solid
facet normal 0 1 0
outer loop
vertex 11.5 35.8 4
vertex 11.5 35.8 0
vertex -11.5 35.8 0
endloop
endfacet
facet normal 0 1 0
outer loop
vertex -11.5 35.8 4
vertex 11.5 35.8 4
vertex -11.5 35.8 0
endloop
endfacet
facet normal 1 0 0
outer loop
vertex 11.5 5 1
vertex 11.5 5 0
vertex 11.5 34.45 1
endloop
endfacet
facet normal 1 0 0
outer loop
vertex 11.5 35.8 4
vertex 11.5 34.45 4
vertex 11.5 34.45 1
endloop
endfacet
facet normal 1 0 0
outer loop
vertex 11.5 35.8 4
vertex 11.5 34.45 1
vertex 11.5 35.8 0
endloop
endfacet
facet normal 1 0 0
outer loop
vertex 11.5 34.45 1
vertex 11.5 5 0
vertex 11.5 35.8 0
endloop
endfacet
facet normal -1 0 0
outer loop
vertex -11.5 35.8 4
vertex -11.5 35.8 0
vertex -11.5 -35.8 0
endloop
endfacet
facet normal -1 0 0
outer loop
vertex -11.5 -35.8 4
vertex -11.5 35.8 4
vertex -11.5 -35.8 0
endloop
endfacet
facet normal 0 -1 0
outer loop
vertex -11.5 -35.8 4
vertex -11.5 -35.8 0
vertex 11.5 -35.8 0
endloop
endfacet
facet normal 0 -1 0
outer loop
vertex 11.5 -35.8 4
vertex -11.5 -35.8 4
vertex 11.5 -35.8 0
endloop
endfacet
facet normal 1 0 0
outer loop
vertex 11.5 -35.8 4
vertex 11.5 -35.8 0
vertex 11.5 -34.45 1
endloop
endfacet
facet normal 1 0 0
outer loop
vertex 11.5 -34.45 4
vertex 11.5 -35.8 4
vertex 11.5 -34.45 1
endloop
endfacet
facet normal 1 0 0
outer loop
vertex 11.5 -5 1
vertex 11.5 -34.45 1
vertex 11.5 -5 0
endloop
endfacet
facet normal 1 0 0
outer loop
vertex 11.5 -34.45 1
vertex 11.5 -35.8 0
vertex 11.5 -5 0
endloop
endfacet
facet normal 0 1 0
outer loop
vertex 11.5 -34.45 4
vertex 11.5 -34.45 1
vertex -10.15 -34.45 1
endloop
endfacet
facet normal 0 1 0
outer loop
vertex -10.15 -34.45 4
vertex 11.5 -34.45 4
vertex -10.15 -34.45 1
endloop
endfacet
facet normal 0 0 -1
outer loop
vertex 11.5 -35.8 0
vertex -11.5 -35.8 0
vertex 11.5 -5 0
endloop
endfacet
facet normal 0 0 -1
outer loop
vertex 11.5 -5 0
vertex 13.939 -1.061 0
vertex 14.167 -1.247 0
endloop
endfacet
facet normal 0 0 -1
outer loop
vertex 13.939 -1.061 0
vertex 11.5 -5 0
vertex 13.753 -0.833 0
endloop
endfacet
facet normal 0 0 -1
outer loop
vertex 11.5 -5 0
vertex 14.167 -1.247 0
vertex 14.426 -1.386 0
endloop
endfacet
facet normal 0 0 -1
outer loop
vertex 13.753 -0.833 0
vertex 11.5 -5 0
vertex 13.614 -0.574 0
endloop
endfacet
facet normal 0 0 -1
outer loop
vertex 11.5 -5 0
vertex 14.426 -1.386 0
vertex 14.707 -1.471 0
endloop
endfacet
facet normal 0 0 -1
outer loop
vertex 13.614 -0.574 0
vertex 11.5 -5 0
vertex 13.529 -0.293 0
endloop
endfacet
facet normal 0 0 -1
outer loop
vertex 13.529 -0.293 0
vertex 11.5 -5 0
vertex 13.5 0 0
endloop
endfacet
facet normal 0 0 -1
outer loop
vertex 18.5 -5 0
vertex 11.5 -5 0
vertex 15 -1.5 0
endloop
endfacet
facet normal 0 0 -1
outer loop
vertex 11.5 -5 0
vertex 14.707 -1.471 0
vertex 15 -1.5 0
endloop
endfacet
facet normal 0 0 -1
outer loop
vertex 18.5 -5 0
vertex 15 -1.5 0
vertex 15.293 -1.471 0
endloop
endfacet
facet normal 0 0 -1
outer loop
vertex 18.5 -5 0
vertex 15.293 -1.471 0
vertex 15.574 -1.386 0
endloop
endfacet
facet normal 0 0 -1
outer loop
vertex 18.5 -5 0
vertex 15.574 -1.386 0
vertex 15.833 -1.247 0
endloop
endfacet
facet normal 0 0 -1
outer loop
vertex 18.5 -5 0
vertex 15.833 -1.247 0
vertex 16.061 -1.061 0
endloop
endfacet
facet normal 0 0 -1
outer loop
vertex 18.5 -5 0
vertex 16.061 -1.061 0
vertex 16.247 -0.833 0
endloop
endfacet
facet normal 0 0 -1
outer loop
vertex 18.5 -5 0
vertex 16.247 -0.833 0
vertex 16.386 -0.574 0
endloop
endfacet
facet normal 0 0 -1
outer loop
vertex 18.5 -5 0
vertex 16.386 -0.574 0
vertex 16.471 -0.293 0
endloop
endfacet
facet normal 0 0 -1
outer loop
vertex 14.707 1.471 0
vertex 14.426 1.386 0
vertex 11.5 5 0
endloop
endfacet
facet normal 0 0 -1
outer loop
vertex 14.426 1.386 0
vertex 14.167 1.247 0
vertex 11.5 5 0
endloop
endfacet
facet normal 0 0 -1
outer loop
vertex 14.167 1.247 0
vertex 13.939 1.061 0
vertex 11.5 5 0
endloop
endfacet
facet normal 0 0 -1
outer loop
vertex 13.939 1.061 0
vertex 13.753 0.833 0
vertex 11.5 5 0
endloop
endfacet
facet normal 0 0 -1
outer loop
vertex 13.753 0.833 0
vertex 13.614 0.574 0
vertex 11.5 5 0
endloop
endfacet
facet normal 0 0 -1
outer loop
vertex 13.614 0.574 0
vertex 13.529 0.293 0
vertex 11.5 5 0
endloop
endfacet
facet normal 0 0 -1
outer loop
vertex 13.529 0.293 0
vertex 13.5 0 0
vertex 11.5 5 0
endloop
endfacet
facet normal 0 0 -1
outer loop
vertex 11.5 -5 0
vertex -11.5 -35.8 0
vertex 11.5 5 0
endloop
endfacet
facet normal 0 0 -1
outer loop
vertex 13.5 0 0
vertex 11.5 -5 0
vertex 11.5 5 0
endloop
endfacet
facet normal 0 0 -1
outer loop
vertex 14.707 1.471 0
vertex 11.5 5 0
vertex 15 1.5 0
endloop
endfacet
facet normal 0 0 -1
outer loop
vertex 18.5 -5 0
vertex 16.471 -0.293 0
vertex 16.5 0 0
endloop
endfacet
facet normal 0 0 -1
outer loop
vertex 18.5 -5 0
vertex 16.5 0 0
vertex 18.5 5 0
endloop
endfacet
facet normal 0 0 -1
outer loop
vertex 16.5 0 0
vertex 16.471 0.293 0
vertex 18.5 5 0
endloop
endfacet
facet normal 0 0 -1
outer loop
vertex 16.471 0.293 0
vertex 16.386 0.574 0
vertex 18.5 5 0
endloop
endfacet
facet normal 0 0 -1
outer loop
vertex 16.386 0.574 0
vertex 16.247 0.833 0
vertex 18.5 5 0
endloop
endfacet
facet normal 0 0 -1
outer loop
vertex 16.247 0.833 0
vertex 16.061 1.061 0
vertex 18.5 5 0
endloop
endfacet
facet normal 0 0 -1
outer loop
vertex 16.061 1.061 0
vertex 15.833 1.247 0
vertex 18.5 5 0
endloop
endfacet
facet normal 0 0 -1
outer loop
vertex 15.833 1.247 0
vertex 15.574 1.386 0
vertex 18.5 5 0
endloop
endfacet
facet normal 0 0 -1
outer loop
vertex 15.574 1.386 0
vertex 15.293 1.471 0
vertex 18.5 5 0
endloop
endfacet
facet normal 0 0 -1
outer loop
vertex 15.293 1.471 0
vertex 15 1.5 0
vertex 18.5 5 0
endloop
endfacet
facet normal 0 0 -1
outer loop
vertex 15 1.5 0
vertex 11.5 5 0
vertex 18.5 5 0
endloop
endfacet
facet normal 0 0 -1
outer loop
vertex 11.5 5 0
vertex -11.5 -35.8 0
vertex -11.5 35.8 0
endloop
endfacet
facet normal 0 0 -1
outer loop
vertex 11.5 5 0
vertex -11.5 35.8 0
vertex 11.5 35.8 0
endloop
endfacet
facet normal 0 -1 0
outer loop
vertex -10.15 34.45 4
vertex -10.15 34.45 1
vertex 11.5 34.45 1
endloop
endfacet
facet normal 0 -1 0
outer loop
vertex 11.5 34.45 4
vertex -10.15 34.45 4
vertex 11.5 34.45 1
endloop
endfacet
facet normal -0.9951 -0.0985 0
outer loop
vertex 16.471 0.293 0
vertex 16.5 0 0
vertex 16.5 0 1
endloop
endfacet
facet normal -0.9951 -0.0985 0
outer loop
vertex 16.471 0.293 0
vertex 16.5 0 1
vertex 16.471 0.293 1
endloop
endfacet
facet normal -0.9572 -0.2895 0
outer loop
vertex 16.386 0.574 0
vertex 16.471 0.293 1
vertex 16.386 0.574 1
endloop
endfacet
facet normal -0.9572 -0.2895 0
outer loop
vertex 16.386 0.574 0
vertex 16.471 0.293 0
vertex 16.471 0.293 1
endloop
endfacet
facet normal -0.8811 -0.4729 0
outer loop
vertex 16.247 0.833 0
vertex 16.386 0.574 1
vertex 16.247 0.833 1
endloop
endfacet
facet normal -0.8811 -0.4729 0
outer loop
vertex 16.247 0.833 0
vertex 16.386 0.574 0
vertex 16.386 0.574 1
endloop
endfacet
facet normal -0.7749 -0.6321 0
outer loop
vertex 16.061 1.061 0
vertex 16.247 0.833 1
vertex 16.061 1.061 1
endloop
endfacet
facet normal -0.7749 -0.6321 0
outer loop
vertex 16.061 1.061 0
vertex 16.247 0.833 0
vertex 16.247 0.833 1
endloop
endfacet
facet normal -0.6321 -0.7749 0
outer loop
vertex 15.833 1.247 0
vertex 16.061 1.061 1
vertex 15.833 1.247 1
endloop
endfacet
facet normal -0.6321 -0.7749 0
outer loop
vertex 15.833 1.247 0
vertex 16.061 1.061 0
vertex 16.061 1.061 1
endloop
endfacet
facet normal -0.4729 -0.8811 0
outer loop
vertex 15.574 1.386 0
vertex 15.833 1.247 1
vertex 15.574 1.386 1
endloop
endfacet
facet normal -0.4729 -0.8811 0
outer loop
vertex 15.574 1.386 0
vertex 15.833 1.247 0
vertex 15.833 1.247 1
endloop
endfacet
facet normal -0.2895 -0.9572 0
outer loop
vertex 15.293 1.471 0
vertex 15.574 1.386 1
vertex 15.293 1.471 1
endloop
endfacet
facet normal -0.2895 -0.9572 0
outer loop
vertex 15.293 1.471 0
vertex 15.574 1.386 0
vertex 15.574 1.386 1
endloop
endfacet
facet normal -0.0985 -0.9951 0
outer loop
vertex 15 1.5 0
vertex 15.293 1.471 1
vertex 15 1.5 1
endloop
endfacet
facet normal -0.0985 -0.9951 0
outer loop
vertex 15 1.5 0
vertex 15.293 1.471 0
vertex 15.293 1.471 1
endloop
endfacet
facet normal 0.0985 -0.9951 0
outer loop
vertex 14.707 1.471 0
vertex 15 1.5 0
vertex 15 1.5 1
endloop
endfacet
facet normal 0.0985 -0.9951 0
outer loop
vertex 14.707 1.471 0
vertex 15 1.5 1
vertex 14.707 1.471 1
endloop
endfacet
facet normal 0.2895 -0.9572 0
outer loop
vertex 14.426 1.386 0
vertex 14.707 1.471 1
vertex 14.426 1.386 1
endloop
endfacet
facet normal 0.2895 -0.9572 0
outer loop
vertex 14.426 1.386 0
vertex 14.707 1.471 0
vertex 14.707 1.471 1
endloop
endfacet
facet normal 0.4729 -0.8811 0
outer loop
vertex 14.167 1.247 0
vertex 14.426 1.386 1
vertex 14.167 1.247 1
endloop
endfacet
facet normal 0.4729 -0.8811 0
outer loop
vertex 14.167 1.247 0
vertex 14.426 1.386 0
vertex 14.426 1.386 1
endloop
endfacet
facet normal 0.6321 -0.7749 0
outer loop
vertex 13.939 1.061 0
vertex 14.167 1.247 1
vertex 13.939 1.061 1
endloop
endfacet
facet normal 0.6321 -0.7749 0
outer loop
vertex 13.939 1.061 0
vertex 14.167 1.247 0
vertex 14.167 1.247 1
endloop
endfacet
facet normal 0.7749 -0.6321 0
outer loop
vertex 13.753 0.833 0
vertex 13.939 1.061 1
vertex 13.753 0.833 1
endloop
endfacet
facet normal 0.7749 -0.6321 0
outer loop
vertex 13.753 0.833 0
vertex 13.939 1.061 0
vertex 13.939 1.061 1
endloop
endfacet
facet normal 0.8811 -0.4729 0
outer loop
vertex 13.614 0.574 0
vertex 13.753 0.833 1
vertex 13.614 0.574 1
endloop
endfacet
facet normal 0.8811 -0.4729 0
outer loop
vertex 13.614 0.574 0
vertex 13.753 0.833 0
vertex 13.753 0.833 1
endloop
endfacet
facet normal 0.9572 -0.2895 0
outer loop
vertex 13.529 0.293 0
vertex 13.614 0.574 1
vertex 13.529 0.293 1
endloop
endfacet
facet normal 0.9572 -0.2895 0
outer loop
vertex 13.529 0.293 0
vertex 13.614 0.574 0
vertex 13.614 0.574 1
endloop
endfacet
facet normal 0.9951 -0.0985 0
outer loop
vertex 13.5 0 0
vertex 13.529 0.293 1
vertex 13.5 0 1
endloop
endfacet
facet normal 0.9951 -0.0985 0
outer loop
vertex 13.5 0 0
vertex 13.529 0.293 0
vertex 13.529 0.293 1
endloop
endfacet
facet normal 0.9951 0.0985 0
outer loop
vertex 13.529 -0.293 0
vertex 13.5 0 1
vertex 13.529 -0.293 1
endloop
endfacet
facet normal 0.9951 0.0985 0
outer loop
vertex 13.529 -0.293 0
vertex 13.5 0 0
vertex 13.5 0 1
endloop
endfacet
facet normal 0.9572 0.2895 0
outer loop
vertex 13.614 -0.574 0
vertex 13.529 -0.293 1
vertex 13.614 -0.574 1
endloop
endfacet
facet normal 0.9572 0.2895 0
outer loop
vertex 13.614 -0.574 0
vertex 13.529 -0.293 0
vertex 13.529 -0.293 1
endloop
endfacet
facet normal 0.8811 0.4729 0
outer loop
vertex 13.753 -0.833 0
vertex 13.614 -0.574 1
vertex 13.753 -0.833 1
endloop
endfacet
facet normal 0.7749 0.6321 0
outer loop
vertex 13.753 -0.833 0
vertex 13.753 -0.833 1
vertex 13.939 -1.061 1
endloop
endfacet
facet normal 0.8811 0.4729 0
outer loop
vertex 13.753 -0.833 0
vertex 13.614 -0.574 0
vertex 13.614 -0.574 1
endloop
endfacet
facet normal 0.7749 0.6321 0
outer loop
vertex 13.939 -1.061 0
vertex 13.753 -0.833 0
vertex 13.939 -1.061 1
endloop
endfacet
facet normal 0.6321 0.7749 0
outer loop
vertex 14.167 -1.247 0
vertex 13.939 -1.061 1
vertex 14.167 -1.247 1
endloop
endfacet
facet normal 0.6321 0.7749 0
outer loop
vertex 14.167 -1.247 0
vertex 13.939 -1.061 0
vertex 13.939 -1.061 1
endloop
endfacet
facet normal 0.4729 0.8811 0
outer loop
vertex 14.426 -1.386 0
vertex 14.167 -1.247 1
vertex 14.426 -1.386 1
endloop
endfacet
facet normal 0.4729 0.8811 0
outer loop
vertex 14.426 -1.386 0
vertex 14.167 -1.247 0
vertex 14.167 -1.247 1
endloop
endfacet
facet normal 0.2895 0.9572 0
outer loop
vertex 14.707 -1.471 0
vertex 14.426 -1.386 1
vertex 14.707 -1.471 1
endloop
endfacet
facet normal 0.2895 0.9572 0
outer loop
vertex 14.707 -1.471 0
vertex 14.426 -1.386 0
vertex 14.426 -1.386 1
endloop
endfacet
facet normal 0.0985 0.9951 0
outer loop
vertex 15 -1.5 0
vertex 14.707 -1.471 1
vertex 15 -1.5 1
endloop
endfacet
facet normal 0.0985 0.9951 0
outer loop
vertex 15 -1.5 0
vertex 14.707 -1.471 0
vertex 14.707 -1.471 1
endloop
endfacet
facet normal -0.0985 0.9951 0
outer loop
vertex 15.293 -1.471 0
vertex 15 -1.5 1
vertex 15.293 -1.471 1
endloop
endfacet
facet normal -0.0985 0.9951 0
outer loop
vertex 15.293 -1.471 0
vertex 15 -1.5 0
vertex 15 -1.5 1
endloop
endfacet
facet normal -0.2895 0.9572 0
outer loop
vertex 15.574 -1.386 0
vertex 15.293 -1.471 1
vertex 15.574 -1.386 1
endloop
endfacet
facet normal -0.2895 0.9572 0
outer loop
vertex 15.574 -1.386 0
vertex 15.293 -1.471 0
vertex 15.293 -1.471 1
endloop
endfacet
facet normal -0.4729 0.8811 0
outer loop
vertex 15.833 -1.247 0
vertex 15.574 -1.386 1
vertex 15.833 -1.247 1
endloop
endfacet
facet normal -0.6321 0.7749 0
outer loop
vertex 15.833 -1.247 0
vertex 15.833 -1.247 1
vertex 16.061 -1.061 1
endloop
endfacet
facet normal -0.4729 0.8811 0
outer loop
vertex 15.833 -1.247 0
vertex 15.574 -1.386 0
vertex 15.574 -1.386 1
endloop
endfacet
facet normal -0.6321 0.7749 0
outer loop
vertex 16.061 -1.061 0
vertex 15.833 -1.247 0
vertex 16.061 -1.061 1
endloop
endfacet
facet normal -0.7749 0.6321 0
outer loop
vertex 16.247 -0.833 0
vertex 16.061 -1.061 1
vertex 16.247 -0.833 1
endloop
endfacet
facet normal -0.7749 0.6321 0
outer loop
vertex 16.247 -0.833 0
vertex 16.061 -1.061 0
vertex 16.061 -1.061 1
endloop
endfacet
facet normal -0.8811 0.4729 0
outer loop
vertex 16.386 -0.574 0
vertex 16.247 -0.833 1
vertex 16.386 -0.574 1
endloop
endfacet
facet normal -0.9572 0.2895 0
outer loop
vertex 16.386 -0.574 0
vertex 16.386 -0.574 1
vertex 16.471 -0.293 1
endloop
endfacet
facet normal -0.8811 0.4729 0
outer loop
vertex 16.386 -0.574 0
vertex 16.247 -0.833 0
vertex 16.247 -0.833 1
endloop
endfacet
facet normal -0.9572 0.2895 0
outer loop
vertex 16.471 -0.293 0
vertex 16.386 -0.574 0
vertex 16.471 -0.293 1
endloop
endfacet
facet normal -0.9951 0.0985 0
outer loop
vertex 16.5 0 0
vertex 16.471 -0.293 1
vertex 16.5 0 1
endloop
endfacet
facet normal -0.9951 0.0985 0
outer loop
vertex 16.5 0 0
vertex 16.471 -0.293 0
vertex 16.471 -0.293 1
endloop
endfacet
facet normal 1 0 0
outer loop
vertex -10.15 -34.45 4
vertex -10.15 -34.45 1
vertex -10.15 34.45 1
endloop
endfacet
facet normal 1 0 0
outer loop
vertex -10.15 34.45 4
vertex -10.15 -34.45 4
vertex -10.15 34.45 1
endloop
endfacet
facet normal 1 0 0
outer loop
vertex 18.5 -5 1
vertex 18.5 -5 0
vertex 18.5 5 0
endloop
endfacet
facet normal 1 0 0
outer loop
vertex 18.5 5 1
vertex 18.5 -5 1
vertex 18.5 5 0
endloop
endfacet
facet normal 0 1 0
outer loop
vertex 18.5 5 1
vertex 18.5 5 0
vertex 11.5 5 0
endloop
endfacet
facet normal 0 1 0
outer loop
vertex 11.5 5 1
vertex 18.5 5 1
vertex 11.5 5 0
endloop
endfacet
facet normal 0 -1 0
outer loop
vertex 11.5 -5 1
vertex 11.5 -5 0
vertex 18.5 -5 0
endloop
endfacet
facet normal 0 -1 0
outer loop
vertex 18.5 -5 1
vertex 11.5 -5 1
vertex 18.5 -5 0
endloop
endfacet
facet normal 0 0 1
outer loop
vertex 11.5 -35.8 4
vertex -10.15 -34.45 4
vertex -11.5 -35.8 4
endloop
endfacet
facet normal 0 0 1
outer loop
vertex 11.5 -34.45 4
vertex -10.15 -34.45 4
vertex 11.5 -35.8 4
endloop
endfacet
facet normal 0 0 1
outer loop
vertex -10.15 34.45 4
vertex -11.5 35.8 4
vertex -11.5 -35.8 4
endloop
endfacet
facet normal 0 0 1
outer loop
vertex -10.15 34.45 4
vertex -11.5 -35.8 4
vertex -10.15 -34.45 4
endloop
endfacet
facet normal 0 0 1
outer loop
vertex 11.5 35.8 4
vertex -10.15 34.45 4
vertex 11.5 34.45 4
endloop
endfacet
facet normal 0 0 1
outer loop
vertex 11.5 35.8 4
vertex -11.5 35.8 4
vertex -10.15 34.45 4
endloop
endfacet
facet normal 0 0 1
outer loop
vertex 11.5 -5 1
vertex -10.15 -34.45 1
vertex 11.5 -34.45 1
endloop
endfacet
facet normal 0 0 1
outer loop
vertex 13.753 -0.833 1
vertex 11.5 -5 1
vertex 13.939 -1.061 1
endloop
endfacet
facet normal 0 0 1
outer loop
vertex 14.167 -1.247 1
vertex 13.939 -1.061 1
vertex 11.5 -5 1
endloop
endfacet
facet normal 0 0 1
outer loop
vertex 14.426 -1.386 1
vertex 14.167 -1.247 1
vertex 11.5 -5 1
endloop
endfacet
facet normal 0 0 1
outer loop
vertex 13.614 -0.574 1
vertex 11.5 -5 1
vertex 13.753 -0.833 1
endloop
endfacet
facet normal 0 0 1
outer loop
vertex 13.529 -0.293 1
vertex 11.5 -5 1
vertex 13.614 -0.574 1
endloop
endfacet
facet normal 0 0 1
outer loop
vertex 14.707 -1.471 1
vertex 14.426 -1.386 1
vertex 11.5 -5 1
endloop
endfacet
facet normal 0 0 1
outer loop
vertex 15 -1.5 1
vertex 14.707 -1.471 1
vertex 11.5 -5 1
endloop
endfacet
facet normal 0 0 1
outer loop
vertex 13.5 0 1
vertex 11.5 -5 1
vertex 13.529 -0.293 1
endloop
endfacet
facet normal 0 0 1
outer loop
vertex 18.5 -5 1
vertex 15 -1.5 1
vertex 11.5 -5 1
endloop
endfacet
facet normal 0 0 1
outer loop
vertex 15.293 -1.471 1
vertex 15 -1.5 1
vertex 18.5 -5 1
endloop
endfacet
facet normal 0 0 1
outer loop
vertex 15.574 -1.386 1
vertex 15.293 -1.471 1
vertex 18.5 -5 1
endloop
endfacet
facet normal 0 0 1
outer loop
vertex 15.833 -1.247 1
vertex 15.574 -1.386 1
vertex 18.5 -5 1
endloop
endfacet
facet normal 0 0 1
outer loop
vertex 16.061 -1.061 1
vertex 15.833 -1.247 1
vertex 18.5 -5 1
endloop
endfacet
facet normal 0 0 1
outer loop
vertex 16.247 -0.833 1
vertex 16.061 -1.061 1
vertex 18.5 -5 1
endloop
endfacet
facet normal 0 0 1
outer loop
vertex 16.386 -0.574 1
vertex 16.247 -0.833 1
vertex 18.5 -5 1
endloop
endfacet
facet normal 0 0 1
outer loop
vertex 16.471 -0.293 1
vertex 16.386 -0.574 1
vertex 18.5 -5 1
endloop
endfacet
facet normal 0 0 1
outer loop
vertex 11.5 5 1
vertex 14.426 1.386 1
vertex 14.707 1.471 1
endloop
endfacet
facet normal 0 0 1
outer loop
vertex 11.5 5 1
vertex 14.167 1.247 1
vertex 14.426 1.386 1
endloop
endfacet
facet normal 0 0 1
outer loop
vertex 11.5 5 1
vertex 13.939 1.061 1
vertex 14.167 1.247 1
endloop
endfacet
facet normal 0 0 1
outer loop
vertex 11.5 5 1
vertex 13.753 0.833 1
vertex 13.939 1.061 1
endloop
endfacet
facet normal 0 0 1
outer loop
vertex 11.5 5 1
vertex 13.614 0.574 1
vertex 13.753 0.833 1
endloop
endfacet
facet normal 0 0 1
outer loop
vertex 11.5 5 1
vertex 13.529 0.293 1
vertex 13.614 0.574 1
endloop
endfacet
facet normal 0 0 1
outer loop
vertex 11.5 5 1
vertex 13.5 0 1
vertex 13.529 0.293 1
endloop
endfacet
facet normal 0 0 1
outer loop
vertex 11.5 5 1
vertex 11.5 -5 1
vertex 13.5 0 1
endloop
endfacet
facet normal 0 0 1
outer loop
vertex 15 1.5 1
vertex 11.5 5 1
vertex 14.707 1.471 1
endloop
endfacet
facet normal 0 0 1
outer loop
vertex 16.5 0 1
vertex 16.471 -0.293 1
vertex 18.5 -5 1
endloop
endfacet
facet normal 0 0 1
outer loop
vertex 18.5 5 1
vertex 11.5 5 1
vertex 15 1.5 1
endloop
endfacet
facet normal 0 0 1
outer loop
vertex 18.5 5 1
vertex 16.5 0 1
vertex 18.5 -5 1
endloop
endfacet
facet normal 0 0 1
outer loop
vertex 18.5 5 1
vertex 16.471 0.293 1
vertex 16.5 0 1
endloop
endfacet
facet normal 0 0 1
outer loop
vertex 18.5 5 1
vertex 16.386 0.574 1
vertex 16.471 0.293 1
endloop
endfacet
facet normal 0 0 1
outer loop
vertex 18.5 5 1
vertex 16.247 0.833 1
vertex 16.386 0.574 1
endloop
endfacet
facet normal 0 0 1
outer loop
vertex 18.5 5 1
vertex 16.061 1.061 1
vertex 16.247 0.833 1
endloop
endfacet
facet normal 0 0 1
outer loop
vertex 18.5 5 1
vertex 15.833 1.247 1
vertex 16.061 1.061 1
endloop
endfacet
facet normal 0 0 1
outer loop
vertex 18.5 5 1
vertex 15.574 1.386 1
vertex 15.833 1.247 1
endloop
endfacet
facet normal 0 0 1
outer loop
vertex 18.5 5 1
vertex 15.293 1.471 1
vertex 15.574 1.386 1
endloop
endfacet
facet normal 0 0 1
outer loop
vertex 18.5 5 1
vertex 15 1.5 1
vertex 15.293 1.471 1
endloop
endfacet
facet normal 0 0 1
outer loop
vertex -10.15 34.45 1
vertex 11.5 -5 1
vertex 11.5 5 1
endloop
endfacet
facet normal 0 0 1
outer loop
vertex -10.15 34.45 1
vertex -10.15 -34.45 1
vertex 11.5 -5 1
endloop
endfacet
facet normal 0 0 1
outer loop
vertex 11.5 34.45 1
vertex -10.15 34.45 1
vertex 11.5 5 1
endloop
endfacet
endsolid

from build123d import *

# Parameters (mm, degrees)
F1_DEPTH = 4
F0_R     = 1.5
F2_DEPTH = 1


with BuildPart() as f1:
    # F0 (on Top) → F1 (new body)
    with BuildSketch(Plane.XY):
        Polygon((11.5, 35.8), (-11.5, 35.8), (-11.5, -35.8), (11.5, -35.8), (11.5, -34.45), (-10.15, -34.45), (-10.15, 34.45), (11.5, 34.45), align=None)
    extrude(amount=F1_DEPTH)

    # F0 (on Top) → F2 (join)
    with BuildSketch(Plane.XY):
        Polygon((11.5, 5), (11.5, 34.45), (-10.15, 34.45), (-10.15, -34.45), (11.5, -34.45), (11.5, -5), (18.5, -5), (18.5, 5), align=None)
        with Locations((15, 0)):
            Circle(F0_R, mode=Mode.SUBTRACT)
    extrude(amount=F2_DEPTH)


solid = f1.part
